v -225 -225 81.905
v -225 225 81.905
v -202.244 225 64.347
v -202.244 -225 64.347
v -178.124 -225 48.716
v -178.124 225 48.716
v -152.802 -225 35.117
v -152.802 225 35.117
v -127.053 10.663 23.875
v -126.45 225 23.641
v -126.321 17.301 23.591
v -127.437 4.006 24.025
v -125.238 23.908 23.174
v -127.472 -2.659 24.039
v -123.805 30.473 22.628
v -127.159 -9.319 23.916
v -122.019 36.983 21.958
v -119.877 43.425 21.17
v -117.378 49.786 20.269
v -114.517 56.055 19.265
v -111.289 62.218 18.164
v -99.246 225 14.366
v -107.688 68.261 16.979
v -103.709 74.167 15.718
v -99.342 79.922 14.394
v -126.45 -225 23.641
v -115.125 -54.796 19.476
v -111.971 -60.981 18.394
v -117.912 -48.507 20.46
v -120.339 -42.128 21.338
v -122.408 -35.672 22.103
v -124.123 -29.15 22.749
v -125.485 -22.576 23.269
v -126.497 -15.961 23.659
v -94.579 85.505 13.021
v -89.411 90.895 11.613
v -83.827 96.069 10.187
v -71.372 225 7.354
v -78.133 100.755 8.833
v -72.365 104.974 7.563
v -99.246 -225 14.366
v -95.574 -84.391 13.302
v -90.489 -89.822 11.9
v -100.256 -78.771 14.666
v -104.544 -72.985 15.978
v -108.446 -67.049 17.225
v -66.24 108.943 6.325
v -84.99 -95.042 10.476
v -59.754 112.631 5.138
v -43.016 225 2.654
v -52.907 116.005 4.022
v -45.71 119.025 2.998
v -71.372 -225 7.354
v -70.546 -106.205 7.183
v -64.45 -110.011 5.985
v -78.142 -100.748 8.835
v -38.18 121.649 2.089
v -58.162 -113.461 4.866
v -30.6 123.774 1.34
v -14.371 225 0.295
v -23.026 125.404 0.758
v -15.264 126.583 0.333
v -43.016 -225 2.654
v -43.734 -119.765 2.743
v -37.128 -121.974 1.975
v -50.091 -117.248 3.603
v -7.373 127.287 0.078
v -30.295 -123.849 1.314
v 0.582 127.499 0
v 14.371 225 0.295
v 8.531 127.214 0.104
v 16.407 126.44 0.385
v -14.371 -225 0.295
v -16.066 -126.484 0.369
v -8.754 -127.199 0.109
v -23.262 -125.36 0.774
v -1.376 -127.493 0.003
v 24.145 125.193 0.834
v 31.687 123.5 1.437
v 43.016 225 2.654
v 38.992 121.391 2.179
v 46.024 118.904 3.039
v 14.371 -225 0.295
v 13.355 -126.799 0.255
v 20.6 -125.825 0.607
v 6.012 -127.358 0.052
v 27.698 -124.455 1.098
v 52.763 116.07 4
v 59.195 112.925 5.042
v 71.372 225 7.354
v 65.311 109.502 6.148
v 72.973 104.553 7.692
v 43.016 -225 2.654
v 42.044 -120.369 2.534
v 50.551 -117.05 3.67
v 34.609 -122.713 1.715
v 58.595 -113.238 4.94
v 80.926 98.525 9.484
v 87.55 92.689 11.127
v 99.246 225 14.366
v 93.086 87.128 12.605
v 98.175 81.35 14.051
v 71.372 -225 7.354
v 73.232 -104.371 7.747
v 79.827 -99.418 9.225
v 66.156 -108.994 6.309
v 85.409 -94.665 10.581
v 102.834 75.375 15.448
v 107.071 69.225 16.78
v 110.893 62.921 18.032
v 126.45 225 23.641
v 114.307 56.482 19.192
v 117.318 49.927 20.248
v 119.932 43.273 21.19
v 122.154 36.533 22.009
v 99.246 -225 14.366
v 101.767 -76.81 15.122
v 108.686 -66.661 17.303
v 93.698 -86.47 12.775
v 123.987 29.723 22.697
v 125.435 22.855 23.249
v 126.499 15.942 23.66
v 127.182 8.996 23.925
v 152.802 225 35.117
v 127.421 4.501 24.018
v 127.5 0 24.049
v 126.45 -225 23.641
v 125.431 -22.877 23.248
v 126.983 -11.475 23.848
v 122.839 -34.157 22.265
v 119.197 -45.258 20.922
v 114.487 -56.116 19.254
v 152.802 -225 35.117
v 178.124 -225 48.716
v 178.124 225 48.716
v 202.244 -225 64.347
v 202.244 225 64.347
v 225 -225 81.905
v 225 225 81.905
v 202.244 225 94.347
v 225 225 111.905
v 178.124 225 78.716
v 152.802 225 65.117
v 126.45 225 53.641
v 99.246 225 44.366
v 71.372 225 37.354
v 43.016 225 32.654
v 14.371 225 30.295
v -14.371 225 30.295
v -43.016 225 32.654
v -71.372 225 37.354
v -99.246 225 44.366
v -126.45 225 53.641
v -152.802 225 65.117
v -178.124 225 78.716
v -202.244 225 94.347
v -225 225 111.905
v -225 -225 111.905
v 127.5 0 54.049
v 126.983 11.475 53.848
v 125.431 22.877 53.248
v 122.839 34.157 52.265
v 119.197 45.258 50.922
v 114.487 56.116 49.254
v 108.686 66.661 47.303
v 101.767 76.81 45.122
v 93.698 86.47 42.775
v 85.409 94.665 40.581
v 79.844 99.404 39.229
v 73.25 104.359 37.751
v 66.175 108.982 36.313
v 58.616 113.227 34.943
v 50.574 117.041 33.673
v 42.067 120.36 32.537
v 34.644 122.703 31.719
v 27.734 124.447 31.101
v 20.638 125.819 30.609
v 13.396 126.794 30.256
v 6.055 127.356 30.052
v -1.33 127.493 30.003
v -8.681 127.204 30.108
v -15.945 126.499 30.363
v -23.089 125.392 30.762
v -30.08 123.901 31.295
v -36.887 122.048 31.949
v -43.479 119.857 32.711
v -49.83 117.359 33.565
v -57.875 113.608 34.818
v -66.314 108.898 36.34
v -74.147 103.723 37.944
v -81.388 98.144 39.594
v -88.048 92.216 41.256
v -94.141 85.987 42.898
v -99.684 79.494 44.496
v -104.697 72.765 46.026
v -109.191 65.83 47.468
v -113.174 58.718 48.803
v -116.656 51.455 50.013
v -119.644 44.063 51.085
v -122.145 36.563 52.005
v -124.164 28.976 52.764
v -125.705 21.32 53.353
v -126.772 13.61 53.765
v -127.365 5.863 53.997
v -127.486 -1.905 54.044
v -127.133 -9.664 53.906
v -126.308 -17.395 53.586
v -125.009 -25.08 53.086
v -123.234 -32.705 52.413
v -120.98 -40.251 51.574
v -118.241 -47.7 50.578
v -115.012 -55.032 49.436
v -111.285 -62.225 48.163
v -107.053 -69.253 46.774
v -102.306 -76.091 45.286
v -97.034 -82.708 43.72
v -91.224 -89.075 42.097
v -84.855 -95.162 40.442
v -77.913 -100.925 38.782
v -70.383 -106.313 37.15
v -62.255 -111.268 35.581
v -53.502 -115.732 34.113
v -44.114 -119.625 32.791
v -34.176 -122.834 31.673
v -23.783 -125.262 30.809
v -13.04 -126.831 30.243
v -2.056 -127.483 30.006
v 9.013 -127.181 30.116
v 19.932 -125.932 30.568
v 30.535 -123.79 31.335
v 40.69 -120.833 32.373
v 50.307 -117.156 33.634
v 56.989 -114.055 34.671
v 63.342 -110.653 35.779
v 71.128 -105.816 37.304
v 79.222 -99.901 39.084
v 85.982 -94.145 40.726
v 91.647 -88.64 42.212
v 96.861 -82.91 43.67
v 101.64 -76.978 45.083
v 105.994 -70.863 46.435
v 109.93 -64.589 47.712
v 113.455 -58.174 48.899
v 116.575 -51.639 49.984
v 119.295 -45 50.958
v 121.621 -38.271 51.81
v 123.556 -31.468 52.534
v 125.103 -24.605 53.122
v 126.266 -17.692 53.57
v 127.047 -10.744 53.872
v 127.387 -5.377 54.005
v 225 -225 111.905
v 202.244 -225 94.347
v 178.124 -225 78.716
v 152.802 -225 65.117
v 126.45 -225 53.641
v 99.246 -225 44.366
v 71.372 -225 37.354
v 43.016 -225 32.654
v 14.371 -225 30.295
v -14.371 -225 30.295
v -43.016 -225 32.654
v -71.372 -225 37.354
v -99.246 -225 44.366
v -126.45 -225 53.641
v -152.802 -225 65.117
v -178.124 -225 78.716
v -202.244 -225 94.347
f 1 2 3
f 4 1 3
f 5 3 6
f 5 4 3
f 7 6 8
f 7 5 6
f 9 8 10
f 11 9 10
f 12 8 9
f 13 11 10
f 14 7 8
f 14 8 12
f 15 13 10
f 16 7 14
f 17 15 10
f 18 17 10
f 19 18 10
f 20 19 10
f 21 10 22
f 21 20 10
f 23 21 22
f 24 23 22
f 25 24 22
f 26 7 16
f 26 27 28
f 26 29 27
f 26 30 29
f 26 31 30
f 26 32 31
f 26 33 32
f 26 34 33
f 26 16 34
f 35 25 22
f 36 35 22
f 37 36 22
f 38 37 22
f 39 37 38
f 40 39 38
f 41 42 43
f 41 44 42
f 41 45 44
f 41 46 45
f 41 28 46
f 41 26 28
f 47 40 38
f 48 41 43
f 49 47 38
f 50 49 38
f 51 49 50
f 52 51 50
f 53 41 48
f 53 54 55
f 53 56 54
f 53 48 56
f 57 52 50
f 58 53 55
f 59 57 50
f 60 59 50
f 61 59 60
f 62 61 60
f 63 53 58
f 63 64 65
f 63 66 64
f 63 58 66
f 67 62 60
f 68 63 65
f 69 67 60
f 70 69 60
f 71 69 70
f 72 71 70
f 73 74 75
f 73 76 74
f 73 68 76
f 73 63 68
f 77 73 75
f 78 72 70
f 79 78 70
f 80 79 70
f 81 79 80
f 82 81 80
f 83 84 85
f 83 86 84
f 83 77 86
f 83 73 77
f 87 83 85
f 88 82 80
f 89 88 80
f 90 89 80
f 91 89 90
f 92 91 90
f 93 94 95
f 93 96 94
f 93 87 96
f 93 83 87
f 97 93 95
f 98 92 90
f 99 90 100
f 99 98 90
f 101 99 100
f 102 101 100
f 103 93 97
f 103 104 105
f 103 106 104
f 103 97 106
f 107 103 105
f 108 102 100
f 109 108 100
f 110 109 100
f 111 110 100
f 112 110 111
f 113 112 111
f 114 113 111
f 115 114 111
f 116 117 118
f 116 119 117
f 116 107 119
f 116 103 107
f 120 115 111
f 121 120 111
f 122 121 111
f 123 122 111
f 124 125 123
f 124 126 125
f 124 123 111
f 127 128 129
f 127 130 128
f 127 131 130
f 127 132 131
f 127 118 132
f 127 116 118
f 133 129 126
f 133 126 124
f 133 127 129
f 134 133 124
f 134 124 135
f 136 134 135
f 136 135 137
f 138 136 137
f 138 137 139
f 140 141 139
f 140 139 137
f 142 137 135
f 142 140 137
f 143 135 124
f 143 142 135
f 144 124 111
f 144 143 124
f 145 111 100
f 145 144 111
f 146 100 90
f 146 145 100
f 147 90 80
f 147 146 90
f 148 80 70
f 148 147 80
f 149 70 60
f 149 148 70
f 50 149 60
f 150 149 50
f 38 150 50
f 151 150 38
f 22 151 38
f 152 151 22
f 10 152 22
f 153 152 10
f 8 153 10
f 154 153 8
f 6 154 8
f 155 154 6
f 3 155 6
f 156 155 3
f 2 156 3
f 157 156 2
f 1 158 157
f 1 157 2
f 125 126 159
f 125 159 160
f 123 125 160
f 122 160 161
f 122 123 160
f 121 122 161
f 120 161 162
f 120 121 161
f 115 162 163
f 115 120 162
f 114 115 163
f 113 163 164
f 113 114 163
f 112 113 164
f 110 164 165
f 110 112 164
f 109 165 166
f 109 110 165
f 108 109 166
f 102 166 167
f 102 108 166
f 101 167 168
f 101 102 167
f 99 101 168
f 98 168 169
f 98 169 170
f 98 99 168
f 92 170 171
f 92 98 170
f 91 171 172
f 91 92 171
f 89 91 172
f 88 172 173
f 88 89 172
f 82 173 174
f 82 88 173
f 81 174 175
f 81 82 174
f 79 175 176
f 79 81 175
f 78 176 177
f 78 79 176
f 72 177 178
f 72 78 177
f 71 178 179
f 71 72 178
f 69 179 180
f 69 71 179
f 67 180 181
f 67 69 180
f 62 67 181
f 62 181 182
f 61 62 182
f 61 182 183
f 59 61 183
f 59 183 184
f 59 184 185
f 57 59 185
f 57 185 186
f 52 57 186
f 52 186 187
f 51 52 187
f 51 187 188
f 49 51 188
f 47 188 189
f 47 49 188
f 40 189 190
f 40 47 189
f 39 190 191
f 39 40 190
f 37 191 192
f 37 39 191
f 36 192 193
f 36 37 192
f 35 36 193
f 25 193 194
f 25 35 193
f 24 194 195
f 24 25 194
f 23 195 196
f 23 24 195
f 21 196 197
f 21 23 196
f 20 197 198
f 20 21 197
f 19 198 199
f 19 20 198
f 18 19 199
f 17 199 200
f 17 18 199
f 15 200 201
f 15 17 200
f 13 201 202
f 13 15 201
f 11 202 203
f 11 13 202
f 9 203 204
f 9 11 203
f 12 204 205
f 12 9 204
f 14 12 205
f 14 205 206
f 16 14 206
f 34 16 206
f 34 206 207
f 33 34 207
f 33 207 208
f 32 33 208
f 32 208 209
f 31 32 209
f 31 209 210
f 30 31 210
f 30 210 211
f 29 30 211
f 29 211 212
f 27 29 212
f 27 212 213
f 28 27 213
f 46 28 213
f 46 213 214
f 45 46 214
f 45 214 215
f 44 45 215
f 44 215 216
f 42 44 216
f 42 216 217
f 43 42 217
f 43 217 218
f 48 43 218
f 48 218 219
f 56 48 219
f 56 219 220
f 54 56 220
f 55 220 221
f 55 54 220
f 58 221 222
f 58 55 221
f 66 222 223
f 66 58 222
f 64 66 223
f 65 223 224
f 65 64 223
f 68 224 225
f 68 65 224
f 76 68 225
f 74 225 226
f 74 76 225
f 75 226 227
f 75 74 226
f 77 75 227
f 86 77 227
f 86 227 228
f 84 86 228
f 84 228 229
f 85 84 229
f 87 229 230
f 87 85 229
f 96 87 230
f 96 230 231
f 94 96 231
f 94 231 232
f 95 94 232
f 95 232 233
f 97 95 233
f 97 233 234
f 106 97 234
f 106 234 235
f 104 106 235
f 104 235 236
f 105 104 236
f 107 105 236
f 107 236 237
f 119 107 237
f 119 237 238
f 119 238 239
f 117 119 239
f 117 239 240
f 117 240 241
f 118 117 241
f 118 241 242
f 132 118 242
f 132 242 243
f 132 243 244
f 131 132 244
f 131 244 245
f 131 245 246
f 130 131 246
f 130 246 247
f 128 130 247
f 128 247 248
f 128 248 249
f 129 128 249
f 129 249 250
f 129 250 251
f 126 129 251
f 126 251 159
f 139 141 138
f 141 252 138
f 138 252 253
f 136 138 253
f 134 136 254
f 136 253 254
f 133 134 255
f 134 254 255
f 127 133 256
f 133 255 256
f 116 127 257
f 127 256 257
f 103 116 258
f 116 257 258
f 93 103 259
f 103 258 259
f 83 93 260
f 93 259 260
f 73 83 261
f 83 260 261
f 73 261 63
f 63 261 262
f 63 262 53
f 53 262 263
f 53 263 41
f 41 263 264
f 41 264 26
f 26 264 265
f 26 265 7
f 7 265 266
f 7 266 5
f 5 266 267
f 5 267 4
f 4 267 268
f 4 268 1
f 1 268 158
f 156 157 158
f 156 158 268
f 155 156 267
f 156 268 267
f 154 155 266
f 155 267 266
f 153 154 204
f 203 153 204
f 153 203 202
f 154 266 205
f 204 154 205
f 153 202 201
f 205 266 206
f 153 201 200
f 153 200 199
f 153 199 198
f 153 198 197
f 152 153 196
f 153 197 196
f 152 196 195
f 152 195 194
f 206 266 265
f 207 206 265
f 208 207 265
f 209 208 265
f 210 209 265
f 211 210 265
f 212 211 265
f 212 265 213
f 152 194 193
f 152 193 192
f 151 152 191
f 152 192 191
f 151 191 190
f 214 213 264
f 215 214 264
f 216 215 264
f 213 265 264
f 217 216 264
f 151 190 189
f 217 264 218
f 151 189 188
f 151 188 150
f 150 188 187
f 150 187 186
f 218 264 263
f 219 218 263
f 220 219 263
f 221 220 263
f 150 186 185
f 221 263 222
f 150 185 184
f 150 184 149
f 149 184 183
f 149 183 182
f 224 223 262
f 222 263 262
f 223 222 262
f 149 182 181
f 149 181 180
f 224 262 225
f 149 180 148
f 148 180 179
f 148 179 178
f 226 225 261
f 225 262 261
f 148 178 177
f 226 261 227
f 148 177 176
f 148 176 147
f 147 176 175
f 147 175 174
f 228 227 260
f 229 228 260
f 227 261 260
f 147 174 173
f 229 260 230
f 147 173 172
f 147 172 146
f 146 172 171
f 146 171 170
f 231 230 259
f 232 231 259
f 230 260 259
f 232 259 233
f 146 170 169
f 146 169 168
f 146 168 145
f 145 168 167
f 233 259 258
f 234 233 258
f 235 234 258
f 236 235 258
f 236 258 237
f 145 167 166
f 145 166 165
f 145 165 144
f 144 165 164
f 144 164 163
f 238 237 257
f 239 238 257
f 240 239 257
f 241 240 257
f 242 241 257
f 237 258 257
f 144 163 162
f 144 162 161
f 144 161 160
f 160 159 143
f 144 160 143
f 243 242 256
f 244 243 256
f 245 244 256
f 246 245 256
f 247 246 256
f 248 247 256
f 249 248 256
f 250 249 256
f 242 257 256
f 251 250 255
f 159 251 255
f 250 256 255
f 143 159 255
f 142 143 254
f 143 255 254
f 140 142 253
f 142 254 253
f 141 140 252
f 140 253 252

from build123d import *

# Parameters (mm, degrees)
PAD_DEPTH    = 225
SKETCH001_R  = 127.5
POCKET_DEPTH = 111.905868


with BuildPart() as part:
    # Sketch → Pad (new body, symmetric)
    with BuildSketch(Plane.XZ):
        with BuildLine():
            ThreePointArc((-225, 111.904868), (0, 30), (225, 111.904868))
            Line((225, 111.904868), (225, 81.904868))
            ThreePointArc((-225, 81.904868), (0, 0), (225, 81.904868))
            Line((-225, 111.904868), (-225, 81.904868))
        make_face()
    extrude(amount=PAD_DEPTH, both=True)

    # Sketch001 → Pocket (cut, through all)
    with BuildSketch(Plane.XY):
        Circle(SKETCH001_R)
    extrude(amount=POCKET_DEPTH, mode=Mode.SUBTRACT)


solid = part.part
